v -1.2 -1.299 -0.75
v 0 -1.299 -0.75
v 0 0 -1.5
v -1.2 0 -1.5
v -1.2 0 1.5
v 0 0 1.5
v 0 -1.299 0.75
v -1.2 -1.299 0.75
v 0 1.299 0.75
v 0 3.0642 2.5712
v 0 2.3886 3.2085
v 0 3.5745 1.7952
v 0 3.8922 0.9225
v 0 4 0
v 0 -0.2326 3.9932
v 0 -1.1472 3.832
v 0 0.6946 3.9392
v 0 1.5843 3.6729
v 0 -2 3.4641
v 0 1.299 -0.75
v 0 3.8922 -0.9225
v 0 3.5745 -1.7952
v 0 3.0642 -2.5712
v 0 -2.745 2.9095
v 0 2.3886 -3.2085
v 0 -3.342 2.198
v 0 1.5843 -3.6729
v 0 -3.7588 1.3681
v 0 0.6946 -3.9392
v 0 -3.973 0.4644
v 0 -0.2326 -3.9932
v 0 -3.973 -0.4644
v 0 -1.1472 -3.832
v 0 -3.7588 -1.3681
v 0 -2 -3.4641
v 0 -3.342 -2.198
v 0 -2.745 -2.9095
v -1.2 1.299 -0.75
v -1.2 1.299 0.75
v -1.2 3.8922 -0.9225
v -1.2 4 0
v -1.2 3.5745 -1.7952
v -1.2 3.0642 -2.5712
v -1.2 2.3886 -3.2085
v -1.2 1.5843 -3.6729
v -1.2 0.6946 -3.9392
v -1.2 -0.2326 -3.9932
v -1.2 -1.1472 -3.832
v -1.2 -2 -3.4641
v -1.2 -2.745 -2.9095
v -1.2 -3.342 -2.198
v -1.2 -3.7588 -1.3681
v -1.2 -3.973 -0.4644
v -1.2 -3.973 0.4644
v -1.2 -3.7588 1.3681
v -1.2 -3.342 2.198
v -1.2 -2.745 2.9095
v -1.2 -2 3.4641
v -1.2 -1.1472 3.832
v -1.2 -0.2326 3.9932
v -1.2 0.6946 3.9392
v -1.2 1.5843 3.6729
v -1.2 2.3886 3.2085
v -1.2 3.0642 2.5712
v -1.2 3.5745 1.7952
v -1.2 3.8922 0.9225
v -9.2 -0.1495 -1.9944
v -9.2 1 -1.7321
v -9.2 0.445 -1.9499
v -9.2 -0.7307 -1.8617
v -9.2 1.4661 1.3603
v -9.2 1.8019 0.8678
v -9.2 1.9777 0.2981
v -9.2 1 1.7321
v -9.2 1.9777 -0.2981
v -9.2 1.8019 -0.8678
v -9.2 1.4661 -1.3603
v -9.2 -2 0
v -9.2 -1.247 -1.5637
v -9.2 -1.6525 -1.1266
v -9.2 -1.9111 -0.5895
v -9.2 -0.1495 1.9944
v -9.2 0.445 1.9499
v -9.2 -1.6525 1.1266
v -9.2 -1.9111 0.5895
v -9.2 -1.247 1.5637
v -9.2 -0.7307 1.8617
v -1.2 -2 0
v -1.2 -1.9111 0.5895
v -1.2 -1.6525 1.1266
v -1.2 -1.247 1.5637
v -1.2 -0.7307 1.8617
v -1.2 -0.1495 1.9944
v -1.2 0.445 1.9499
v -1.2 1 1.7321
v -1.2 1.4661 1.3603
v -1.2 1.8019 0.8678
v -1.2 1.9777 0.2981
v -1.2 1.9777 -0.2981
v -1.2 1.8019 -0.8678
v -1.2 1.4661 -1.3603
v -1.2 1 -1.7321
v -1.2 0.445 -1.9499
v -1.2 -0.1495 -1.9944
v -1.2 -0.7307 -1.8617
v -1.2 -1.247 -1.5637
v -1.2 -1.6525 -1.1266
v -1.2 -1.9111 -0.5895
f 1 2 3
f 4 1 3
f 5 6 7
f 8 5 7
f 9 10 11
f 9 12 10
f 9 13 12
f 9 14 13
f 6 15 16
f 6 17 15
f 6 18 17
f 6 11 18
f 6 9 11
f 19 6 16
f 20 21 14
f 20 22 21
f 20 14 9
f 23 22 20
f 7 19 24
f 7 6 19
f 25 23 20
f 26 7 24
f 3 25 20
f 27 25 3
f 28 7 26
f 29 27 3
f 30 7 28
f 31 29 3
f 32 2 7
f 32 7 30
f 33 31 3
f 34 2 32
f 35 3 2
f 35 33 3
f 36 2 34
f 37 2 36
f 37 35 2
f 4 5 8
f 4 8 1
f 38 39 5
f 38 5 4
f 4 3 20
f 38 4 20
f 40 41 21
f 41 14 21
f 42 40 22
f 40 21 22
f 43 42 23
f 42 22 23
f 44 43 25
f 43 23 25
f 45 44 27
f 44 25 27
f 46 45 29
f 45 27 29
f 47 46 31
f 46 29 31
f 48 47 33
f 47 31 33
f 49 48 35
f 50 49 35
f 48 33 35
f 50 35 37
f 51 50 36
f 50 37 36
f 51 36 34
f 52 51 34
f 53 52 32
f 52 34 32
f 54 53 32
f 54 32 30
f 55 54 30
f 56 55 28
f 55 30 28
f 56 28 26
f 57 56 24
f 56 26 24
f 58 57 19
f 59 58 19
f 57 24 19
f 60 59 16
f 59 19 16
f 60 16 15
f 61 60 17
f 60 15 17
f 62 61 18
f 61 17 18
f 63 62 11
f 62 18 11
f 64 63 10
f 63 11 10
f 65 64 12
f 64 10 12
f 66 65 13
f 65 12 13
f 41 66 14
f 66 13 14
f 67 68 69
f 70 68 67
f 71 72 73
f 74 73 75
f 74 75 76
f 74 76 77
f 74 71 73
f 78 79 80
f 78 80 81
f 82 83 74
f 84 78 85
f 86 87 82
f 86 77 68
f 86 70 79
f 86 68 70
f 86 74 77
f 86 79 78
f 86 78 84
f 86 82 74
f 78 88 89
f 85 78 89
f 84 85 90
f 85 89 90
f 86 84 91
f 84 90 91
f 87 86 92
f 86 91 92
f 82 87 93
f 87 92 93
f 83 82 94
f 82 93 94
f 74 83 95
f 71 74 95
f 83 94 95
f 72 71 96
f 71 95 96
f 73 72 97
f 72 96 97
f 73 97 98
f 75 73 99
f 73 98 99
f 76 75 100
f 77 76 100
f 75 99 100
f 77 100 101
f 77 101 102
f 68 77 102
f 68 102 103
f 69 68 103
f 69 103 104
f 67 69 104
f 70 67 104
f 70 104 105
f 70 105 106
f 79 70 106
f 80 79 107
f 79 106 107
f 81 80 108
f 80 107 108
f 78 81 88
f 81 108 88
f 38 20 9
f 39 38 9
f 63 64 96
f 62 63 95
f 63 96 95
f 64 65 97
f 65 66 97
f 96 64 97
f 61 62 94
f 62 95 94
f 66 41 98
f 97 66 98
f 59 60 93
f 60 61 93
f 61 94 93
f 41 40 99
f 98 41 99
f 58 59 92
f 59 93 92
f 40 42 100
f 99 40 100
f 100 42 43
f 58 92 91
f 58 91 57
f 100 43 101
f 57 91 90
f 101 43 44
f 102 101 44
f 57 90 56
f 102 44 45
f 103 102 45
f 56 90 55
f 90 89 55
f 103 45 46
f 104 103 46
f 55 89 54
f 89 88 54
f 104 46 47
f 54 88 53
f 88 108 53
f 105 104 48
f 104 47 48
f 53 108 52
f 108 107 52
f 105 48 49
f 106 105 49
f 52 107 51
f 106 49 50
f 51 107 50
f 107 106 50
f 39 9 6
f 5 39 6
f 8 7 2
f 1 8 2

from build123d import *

# Parameters (mm, degrees)
SKETCH_1_W          = 1.2
SKETCH_1_H          = 4
SKETCH_2_R          = 2
EXTRUDE_1_DEPTH     = 8
CUT_EXTRUDE_1_DEPTH = 1.2


with BuildPart() as part:
    # 草图1 → 旋转1 (revolve)
    with BuildSketch(Plane.XY):
        with Locations((-0.6, 2)):
            Rectangle(SKETCH_1_W, SKETCH_1_H)
    revolve(axis=Axis((0, 0, 0), (-1, 0, 0)))

    # 草图2 → 凸台-拉伸1 (add)
    with BuildSketch(Plane.ZY.offset(1.2)):
        with Locations(Location((0, 0, 0), (0, 0, 270))):
            Circle(SKETCH_2_R)
    extrude(amount=EXTRUDE_1_DEPTH)

    # 草图3 → 切除-拉伸1 (cut)
    with BuildSketch(Plane(origin=(0, 0, 0), x_dir=(0, 0, -1), z_dir=(1, 0, 0))):
        Polygon((0.75, 1.299038106), (-0.75, 1.299038106), (-1.5, 0), (-0.75, -1.299038106), (0.75, -1.299038106), (1.5, 0), align=None)
    extrude(amount=-CUT_EXTRUDE_1_DEPTH, mode=Mode.SUBTRACT)


solid = part.part
